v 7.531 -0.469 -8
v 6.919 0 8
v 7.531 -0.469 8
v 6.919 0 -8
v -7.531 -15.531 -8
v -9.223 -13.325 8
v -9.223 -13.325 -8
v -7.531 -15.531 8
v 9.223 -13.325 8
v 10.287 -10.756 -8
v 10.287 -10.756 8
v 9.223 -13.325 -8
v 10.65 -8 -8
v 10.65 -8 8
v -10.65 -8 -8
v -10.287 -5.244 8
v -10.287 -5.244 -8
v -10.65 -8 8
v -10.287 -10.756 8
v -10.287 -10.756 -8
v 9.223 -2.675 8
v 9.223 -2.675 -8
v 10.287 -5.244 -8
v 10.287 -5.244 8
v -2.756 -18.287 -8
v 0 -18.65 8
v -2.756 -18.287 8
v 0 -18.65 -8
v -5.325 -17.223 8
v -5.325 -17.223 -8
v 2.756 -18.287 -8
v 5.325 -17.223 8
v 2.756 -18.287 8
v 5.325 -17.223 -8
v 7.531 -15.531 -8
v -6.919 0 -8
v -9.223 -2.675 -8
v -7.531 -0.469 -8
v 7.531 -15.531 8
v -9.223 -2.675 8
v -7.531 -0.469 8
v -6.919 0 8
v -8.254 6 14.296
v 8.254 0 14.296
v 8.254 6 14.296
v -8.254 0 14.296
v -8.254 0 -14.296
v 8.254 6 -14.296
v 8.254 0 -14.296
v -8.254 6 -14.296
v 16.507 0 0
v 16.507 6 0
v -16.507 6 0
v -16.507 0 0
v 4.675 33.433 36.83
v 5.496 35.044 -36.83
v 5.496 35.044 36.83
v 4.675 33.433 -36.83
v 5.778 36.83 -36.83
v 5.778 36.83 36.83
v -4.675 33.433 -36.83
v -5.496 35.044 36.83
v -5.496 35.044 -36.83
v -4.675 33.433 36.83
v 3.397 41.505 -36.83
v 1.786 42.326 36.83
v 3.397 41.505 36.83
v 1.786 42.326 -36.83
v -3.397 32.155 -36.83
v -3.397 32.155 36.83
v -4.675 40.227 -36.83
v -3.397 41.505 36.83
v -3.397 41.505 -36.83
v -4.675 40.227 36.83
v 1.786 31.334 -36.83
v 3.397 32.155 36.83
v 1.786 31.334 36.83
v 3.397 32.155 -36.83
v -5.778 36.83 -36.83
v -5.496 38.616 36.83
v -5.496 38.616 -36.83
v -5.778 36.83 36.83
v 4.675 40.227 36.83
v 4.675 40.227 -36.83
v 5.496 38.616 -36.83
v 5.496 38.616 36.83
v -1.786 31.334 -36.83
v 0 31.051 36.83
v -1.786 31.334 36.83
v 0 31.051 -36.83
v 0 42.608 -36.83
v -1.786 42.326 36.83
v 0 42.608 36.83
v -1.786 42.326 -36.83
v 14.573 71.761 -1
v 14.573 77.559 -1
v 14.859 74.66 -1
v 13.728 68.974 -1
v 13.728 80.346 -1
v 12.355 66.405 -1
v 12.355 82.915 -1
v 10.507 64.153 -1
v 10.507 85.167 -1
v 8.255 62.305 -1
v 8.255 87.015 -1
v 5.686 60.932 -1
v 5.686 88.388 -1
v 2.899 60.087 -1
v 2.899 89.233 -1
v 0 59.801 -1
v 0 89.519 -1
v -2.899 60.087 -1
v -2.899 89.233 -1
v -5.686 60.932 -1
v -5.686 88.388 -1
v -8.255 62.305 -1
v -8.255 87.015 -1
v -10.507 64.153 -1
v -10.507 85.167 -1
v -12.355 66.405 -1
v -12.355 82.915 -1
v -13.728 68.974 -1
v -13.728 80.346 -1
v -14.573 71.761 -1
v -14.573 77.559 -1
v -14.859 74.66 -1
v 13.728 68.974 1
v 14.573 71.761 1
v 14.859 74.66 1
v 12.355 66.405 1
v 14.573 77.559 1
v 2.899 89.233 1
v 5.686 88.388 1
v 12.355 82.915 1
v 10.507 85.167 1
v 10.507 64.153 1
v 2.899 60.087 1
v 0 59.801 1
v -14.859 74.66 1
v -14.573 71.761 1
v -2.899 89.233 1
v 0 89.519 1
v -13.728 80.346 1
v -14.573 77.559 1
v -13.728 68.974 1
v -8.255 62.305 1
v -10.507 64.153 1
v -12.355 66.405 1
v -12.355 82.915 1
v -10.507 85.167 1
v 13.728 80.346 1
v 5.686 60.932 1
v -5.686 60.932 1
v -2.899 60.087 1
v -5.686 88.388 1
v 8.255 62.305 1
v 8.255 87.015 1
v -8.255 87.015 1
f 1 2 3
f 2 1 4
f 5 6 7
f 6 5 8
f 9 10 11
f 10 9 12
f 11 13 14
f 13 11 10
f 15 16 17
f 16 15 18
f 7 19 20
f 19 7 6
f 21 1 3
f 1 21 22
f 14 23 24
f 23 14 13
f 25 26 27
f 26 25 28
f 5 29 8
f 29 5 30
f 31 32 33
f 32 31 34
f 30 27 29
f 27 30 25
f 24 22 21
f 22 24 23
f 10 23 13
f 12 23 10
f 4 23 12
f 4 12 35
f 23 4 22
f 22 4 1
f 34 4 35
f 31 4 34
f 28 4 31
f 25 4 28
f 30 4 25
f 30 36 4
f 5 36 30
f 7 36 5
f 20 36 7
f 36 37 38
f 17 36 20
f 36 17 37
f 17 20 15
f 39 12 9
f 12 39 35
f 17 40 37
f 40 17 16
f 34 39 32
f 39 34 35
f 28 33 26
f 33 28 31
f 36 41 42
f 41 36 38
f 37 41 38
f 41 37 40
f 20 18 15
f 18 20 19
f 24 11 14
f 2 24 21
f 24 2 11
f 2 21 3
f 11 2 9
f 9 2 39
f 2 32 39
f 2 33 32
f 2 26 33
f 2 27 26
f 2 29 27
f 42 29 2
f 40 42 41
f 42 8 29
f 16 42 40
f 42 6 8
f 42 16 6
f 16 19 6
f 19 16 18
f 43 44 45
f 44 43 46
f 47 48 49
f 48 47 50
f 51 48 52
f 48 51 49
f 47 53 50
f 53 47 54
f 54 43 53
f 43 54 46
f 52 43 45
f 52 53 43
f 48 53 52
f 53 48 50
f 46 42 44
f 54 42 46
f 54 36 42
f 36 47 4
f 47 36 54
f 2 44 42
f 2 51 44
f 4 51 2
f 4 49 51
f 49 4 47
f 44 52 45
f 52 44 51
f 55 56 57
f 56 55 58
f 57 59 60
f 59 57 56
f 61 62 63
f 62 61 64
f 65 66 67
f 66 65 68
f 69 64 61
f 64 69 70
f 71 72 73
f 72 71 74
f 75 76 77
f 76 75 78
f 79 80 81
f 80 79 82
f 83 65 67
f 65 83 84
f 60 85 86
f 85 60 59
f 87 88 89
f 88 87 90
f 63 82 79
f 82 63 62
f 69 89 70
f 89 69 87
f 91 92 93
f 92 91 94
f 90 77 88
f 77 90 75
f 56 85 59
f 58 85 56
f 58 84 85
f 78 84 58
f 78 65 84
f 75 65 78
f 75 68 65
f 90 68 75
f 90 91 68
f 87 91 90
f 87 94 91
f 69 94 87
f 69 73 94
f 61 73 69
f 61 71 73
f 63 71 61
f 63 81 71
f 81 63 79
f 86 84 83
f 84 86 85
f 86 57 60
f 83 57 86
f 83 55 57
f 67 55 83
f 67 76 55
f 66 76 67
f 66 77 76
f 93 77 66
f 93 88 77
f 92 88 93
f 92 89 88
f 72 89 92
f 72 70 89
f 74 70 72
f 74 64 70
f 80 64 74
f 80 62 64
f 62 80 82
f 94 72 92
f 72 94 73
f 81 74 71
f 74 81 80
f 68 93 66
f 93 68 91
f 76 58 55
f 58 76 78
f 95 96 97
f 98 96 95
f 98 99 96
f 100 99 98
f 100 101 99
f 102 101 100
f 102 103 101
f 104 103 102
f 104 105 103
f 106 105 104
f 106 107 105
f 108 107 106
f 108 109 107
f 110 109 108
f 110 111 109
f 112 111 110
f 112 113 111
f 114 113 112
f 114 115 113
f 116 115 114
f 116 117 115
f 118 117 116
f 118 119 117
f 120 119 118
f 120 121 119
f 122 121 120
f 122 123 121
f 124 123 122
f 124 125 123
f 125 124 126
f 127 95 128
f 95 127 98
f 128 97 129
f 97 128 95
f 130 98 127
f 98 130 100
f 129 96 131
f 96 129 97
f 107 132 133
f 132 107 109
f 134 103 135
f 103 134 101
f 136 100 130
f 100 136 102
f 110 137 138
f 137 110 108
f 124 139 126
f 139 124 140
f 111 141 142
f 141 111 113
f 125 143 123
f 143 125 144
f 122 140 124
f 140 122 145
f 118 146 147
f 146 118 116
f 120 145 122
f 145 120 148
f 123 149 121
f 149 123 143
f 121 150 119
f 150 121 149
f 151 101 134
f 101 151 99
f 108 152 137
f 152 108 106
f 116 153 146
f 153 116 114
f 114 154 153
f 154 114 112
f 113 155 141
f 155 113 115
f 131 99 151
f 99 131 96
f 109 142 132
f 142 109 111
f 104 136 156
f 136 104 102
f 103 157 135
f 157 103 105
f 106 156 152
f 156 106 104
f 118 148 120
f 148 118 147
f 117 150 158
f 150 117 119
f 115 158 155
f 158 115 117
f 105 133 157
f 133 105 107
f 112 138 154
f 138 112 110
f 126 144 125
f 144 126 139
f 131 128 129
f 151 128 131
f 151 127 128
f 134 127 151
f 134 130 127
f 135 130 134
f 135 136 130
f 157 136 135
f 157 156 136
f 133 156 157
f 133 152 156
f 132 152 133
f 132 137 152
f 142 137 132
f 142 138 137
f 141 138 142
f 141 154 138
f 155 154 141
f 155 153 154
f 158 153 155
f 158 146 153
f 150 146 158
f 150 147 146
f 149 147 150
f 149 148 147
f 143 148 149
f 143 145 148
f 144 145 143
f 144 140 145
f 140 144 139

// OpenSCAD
// Auto-generated by scripts/author_from_manifest.py (Phase D.3).
// Source: data/phase_d_manifest.json (sku_intent='tyco-ty6226-esfr-upright-k140-165f').
// Do not hand-edit — regenerate from the manifest.
//
// @part tyco_ty6226_esfr_upright_k140_165f
// @kind sprinkler_head
// @category head.upright.k140
// @display-name "Tyco TY6226 ESFR Upright K14.0 165°F"
// @mfg tyco_fire_protection
// @mfg-pn TY6226
// @listing UL FM
// @hazard-classes ESFR
// @price-usd 48.00
// @install-minutes 12
// @crew journeyman
// @k-factor 14
// @orientation upright
// @response quick
// @temperature 165F
// @param size_in number default=0.5 label="Size" unit="in"
// @port inlet position=[0,0.014,0] direction=[0,1,0] style=NPT_threaded size_in=0.75 role=drop

size_in = 0.5;
k_factor = 14.0;

length_mm   = 73.66;
body_dia_mm = 33.02;
thread_od   = 21.3;
thread_len  = 16;
deflector_d = body_dia_mm * 0.9;

rotate([180,0,0]) union() {
    translate([0, thread_len/2, 0])
        cylinder(h = thread_len, d = thread_od, center = true, $fn = 24);
    translate([0, -3, 0])
        rotate([90, 0, 0])
        cylinder(h = 6, d = thread_od * 1.55, $fn = 6, center = true);
    translate([0, -length_mm/2, 0])
        cylinder(h = length_mm, d = body_dia_mm * 0.35, center = true, $fn = 20);
    translate([0, -length_mm - 1, 0])
        cylinder(h = 2, d = deflector_d, center = true, $fn = 32);
}
